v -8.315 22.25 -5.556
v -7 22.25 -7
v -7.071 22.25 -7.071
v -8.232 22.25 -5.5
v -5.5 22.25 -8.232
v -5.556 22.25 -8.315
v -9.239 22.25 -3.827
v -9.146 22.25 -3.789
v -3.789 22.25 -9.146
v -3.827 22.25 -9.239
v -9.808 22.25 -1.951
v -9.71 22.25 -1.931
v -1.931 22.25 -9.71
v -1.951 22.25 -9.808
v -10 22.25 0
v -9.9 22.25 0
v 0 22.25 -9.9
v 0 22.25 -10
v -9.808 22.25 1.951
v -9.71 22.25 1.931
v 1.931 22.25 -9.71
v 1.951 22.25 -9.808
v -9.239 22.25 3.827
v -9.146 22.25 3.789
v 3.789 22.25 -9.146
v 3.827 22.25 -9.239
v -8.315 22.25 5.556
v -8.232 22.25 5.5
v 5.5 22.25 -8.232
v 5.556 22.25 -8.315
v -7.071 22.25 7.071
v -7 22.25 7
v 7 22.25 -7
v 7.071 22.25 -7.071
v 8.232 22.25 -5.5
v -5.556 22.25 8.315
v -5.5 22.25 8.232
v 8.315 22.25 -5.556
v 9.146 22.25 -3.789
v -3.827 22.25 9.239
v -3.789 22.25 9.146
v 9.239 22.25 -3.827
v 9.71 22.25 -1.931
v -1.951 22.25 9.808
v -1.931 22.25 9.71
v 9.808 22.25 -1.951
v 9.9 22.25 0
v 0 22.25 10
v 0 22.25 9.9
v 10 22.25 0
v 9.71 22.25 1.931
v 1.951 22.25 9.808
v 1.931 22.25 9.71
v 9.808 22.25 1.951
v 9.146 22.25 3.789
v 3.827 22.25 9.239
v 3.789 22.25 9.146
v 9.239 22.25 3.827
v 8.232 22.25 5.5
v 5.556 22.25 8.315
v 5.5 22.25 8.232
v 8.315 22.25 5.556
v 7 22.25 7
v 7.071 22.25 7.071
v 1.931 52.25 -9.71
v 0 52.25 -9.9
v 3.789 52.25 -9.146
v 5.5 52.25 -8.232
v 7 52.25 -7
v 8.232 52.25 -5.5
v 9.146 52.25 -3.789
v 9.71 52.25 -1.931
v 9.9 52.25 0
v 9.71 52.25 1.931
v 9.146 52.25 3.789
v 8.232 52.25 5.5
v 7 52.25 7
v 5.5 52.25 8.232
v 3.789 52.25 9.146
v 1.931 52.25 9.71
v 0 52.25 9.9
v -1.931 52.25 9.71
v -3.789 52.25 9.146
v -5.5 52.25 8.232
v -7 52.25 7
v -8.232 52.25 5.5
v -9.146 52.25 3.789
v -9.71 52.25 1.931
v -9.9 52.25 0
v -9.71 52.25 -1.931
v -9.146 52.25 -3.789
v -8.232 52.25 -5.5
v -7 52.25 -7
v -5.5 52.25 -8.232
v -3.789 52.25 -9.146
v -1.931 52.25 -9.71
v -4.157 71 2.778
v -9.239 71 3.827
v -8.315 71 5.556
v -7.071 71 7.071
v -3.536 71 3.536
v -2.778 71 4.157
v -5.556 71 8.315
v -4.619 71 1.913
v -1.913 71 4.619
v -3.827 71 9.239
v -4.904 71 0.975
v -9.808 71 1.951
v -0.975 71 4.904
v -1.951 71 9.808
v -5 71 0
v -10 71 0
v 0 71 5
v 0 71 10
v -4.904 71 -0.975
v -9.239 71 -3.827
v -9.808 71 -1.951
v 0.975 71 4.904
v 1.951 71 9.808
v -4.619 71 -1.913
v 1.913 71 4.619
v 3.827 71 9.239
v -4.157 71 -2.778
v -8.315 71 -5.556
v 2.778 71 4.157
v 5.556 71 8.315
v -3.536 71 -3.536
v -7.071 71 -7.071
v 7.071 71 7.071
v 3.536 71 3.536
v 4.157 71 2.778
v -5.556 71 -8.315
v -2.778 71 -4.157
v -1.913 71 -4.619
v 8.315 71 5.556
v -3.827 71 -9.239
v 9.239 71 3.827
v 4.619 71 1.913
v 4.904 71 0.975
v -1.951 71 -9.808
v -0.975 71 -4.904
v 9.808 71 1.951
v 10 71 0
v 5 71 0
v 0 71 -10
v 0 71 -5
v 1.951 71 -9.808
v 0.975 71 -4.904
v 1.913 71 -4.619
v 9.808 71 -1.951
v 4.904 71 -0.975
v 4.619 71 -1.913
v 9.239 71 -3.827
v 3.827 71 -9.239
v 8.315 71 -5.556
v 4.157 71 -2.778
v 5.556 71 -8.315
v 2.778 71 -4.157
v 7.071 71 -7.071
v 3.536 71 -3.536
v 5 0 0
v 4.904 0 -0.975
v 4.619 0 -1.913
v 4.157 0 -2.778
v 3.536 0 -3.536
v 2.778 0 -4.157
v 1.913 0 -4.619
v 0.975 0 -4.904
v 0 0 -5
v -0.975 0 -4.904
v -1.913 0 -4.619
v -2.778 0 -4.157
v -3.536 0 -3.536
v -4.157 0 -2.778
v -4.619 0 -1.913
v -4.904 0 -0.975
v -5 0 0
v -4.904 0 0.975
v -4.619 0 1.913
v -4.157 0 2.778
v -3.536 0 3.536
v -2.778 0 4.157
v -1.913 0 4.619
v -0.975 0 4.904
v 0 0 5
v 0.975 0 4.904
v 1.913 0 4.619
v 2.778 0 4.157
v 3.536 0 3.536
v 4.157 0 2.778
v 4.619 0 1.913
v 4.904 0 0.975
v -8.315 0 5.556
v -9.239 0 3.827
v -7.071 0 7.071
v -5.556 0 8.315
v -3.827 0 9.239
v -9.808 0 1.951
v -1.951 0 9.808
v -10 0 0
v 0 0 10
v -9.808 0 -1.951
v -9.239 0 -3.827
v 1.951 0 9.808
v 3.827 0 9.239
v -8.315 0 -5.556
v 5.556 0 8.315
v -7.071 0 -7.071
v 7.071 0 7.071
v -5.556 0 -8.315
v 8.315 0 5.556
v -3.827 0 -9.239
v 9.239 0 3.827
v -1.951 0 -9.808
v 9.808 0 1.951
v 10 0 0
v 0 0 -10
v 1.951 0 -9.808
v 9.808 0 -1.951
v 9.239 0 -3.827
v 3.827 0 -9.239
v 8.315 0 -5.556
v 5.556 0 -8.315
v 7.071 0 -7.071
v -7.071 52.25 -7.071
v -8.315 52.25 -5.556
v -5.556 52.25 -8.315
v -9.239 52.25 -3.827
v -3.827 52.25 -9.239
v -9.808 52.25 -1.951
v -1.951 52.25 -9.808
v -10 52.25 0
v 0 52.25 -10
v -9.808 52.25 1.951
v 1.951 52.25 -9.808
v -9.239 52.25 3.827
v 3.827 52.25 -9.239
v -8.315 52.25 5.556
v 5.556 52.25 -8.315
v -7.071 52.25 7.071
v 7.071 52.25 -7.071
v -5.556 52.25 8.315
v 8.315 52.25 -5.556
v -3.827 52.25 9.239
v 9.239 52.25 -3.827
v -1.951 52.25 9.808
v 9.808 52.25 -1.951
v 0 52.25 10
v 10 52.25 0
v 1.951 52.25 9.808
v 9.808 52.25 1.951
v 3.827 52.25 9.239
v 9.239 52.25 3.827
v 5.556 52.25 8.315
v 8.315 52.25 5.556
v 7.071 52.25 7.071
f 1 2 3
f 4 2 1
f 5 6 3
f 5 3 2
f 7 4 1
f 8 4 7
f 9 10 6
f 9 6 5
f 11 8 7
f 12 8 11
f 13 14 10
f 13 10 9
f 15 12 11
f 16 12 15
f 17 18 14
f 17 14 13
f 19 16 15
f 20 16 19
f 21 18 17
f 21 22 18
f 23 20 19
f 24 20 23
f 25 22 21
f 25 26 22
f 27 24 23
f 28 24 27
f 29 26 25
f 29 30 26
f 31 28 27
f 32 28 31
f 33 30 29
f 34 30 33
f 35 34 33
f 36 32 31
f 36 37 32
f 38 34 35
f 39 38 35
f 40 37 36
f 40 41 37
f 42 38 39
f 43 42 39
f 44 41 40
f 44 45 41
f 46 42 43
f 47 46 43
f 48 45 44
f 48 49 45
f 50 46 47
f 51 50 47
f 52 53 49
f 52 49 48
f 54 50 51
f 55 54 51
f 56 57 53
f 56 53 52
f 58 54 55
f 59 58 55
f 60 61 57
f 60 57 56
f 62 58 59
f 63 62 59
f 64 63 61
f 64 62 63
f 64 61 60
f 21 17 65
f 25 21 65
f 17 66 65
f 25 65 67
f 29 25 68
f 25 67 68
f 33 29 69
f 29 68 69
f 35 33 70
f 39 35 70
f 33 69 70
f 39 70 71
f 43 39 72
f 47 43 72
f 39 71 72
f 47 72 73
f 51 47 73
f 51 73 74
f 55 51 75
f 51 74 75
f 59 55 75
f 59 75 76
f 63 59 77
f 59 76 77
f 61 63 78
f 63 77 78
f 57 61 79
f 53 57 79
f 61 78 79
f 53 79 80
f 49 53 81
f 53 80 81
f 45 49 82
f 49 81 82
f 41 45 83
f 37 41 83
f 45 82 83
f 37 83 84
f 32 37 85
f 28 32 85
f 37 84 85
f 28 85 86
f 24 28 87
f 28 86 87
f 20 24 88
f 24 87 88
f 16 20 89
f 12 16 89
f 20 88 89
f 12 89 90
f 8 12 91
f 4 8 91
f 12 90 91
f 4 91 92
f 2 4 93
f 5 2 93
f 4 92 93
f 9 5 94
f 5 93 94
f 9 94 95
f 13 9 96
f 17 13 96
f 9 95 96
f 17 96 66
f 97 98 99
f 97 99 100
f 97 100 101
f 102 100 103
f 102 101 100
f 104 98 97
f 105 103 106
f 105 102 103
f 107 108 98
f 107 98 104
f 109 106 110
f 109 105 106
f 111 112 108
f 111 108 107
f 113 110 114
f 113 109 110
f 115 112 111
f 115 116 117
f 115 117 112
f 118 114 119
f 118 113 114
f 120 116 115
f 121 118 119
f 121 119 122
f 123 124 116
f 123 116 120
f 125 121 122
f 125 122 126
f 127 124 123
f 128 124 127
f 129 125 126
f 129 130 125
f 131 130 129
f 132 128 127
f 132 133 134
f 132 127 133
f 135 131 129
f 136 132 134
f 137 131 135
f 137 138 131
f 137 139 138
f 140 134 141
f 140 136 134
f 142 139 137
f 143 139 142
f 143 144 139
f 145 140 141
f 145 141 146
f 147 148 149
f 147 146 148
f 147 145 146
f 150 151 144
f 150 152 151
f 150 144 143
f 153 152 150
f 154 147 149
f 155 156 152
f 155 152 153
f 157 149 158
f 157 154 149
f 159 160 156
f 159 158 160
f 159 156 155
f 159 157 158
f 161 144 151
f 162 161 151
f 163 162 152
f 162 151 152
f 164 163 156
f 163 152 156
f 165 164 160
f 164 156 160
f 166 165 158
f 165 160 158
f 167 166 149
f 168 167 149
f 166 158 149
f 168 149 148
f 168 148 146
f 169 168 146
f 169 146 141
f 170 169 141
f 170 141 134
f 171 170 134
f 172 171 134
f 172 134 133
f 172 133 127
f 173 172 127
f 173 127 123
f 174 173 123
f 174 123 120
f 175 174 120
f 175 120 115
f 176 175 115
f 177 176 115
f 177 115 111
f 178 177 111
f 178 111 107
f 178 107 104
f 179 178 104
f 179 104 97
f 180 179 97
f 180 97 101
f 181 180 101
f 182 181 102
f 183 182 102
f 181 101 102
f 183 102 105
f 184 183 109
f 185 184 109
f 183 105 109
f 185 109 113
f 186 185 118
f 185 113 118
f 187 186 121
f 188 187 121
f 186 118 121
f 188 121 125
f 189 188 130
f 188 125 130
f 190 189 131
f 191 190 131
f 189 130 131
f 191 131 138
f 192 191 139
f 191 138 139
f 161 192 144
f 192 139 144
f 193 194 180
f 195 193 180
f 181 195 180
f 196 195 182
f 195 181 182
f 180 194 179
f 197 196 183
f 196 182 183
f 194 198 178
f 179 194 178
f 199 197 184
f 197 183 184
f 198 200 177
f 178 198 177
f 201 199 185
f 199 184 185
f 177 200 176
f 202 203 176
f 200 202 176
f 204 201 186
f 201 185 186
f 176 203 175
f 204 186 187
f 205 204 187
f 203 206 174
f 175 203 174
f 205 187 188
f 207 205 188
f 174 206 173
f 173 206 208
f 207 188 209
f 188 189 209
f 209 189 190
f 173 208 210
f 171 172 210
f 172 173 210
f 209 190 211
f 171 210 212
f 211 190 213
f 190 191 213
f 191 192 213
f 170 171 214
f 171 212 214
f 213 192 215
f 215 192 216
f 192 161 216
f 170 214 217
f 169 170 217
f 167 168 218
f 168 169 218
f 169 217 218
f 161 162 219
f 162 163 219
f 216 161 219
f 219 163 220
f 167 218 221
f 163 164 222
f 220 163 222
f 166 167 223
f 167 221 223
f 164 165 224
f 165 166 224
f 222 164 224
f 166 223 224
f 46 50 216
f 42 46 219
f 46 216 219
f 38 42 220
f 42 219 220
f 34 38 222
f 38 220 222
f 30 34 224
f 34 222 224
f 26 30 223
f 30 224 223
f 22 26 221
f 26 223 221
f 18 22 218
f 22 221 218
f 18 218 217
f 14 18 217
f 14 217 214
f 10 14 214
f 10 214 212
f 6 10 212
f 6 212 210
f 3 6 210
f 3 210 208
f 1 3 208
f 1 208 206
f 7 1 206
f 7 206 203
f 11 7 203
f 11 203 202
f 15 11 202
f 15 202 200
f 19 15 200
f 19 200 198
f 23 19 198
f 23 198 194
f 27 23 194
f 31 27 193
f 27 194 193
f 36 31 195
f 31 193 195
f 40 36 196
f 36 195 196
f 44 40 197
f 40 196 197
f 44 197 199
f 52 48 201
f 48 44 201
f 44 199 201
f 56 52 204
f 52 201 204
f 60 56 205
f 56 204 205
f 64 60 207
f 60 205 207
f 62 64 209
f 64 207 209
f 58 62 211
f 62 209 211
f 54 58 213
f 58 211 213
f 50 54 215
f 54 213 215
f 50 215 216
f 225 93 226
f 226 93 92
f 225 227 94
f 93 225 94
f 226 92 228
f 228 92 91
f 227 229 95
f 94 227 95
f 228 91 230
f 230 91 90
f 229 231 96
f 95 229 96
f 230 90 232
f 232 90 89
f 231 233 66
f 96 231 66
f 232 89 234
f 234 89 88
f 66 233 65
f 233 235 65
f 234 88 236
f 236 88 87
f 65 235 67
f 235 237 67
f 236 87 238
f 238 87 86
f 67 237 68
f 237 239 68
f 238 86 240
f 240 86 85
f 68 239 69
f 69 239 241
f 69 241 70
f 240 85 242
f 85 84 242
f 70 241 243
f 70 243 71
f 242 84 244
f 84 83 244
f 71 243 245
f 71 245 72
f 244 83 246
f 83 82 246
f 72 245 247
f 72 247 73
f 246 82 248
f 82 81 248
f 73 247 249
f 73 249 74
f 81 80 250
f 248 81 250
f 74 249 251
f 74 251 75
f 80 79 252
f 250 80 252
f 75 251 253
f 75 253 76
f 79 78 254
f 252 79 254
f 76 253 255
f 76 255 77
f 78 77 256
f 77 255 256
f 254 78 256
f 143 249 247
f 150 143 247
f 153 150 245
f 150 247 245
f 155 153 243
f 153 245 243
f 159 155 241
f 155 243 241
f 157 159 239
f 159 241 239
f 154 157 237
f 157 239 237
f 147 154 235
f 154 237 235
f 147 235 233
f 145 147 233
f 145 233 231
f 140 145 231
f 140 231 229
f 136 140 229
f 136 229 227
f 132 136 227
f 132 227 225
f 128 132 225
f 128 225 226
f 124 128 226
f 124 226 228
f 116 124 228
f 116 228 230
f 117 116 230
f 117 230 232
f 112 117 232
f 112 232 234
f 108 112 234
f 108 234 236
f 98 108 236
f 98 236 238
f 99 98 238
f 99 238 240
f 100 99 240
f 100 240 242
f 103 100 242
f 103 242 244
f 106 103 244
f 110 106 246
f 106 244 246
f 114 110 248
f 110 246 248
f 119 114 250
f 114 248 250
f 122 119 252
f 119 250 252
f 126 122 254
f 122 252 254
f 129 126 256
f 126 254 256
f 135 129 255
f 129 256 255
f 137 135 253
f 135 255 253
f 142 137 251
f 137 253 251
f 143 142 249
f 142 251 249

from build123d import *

# Parameters (mm, degrees)
CROQUIS1_R              = 10
SALIENTE_EXTRUIR1_DEPTH = 71
CROQUIS2_R              = 5
CORTAR_EXTRUIR1_DEPTH   = 72
CROQUIS3_W              = 0.1
CROQUIS3_H              = 30


with BuildPart() as part:
    # Croquis1 → Saliente-Extruir1 (new body)
    with BuildSketch(Plane(origin=(0, 0, 0), x_dir=(1, 0, 0), z_dir=(0, 1, 0))):
        Circle(CROQUIS1_R)
    extrude(amount=SALIENTE_EXTRUIR1_DEPTH)

    # Croquis2 → Cortar-Extruir1 (cut, through all)
    with BuildSketch(Plane(origin=(0, 71, 0), x_dir=(1, 0, 0), z_dir=(0, 1, 0))):
        Circle(CROQUIS2_R)
    extrude(amount=-CORTAR_EXTRUIR1_DEPTH, mode=Mode.SUBTRACT)

    # Croquis3 → Cortar-Revolución1 (revolve, cut)
    with BuildSketch(Plane(origin=(0, 0, 0), x_dir=(0, 0, -1), z_dir=(1, 0, 0))):
        with Locations((9.95, 37.25)):
            Rectangle(CROQUIS3_W, CROQUIS3_H)
    revolve(axis=Axis((0, 71, 0), (0, -1, 0)), mode=Mode.SUBTRACT)


solid = part.part
